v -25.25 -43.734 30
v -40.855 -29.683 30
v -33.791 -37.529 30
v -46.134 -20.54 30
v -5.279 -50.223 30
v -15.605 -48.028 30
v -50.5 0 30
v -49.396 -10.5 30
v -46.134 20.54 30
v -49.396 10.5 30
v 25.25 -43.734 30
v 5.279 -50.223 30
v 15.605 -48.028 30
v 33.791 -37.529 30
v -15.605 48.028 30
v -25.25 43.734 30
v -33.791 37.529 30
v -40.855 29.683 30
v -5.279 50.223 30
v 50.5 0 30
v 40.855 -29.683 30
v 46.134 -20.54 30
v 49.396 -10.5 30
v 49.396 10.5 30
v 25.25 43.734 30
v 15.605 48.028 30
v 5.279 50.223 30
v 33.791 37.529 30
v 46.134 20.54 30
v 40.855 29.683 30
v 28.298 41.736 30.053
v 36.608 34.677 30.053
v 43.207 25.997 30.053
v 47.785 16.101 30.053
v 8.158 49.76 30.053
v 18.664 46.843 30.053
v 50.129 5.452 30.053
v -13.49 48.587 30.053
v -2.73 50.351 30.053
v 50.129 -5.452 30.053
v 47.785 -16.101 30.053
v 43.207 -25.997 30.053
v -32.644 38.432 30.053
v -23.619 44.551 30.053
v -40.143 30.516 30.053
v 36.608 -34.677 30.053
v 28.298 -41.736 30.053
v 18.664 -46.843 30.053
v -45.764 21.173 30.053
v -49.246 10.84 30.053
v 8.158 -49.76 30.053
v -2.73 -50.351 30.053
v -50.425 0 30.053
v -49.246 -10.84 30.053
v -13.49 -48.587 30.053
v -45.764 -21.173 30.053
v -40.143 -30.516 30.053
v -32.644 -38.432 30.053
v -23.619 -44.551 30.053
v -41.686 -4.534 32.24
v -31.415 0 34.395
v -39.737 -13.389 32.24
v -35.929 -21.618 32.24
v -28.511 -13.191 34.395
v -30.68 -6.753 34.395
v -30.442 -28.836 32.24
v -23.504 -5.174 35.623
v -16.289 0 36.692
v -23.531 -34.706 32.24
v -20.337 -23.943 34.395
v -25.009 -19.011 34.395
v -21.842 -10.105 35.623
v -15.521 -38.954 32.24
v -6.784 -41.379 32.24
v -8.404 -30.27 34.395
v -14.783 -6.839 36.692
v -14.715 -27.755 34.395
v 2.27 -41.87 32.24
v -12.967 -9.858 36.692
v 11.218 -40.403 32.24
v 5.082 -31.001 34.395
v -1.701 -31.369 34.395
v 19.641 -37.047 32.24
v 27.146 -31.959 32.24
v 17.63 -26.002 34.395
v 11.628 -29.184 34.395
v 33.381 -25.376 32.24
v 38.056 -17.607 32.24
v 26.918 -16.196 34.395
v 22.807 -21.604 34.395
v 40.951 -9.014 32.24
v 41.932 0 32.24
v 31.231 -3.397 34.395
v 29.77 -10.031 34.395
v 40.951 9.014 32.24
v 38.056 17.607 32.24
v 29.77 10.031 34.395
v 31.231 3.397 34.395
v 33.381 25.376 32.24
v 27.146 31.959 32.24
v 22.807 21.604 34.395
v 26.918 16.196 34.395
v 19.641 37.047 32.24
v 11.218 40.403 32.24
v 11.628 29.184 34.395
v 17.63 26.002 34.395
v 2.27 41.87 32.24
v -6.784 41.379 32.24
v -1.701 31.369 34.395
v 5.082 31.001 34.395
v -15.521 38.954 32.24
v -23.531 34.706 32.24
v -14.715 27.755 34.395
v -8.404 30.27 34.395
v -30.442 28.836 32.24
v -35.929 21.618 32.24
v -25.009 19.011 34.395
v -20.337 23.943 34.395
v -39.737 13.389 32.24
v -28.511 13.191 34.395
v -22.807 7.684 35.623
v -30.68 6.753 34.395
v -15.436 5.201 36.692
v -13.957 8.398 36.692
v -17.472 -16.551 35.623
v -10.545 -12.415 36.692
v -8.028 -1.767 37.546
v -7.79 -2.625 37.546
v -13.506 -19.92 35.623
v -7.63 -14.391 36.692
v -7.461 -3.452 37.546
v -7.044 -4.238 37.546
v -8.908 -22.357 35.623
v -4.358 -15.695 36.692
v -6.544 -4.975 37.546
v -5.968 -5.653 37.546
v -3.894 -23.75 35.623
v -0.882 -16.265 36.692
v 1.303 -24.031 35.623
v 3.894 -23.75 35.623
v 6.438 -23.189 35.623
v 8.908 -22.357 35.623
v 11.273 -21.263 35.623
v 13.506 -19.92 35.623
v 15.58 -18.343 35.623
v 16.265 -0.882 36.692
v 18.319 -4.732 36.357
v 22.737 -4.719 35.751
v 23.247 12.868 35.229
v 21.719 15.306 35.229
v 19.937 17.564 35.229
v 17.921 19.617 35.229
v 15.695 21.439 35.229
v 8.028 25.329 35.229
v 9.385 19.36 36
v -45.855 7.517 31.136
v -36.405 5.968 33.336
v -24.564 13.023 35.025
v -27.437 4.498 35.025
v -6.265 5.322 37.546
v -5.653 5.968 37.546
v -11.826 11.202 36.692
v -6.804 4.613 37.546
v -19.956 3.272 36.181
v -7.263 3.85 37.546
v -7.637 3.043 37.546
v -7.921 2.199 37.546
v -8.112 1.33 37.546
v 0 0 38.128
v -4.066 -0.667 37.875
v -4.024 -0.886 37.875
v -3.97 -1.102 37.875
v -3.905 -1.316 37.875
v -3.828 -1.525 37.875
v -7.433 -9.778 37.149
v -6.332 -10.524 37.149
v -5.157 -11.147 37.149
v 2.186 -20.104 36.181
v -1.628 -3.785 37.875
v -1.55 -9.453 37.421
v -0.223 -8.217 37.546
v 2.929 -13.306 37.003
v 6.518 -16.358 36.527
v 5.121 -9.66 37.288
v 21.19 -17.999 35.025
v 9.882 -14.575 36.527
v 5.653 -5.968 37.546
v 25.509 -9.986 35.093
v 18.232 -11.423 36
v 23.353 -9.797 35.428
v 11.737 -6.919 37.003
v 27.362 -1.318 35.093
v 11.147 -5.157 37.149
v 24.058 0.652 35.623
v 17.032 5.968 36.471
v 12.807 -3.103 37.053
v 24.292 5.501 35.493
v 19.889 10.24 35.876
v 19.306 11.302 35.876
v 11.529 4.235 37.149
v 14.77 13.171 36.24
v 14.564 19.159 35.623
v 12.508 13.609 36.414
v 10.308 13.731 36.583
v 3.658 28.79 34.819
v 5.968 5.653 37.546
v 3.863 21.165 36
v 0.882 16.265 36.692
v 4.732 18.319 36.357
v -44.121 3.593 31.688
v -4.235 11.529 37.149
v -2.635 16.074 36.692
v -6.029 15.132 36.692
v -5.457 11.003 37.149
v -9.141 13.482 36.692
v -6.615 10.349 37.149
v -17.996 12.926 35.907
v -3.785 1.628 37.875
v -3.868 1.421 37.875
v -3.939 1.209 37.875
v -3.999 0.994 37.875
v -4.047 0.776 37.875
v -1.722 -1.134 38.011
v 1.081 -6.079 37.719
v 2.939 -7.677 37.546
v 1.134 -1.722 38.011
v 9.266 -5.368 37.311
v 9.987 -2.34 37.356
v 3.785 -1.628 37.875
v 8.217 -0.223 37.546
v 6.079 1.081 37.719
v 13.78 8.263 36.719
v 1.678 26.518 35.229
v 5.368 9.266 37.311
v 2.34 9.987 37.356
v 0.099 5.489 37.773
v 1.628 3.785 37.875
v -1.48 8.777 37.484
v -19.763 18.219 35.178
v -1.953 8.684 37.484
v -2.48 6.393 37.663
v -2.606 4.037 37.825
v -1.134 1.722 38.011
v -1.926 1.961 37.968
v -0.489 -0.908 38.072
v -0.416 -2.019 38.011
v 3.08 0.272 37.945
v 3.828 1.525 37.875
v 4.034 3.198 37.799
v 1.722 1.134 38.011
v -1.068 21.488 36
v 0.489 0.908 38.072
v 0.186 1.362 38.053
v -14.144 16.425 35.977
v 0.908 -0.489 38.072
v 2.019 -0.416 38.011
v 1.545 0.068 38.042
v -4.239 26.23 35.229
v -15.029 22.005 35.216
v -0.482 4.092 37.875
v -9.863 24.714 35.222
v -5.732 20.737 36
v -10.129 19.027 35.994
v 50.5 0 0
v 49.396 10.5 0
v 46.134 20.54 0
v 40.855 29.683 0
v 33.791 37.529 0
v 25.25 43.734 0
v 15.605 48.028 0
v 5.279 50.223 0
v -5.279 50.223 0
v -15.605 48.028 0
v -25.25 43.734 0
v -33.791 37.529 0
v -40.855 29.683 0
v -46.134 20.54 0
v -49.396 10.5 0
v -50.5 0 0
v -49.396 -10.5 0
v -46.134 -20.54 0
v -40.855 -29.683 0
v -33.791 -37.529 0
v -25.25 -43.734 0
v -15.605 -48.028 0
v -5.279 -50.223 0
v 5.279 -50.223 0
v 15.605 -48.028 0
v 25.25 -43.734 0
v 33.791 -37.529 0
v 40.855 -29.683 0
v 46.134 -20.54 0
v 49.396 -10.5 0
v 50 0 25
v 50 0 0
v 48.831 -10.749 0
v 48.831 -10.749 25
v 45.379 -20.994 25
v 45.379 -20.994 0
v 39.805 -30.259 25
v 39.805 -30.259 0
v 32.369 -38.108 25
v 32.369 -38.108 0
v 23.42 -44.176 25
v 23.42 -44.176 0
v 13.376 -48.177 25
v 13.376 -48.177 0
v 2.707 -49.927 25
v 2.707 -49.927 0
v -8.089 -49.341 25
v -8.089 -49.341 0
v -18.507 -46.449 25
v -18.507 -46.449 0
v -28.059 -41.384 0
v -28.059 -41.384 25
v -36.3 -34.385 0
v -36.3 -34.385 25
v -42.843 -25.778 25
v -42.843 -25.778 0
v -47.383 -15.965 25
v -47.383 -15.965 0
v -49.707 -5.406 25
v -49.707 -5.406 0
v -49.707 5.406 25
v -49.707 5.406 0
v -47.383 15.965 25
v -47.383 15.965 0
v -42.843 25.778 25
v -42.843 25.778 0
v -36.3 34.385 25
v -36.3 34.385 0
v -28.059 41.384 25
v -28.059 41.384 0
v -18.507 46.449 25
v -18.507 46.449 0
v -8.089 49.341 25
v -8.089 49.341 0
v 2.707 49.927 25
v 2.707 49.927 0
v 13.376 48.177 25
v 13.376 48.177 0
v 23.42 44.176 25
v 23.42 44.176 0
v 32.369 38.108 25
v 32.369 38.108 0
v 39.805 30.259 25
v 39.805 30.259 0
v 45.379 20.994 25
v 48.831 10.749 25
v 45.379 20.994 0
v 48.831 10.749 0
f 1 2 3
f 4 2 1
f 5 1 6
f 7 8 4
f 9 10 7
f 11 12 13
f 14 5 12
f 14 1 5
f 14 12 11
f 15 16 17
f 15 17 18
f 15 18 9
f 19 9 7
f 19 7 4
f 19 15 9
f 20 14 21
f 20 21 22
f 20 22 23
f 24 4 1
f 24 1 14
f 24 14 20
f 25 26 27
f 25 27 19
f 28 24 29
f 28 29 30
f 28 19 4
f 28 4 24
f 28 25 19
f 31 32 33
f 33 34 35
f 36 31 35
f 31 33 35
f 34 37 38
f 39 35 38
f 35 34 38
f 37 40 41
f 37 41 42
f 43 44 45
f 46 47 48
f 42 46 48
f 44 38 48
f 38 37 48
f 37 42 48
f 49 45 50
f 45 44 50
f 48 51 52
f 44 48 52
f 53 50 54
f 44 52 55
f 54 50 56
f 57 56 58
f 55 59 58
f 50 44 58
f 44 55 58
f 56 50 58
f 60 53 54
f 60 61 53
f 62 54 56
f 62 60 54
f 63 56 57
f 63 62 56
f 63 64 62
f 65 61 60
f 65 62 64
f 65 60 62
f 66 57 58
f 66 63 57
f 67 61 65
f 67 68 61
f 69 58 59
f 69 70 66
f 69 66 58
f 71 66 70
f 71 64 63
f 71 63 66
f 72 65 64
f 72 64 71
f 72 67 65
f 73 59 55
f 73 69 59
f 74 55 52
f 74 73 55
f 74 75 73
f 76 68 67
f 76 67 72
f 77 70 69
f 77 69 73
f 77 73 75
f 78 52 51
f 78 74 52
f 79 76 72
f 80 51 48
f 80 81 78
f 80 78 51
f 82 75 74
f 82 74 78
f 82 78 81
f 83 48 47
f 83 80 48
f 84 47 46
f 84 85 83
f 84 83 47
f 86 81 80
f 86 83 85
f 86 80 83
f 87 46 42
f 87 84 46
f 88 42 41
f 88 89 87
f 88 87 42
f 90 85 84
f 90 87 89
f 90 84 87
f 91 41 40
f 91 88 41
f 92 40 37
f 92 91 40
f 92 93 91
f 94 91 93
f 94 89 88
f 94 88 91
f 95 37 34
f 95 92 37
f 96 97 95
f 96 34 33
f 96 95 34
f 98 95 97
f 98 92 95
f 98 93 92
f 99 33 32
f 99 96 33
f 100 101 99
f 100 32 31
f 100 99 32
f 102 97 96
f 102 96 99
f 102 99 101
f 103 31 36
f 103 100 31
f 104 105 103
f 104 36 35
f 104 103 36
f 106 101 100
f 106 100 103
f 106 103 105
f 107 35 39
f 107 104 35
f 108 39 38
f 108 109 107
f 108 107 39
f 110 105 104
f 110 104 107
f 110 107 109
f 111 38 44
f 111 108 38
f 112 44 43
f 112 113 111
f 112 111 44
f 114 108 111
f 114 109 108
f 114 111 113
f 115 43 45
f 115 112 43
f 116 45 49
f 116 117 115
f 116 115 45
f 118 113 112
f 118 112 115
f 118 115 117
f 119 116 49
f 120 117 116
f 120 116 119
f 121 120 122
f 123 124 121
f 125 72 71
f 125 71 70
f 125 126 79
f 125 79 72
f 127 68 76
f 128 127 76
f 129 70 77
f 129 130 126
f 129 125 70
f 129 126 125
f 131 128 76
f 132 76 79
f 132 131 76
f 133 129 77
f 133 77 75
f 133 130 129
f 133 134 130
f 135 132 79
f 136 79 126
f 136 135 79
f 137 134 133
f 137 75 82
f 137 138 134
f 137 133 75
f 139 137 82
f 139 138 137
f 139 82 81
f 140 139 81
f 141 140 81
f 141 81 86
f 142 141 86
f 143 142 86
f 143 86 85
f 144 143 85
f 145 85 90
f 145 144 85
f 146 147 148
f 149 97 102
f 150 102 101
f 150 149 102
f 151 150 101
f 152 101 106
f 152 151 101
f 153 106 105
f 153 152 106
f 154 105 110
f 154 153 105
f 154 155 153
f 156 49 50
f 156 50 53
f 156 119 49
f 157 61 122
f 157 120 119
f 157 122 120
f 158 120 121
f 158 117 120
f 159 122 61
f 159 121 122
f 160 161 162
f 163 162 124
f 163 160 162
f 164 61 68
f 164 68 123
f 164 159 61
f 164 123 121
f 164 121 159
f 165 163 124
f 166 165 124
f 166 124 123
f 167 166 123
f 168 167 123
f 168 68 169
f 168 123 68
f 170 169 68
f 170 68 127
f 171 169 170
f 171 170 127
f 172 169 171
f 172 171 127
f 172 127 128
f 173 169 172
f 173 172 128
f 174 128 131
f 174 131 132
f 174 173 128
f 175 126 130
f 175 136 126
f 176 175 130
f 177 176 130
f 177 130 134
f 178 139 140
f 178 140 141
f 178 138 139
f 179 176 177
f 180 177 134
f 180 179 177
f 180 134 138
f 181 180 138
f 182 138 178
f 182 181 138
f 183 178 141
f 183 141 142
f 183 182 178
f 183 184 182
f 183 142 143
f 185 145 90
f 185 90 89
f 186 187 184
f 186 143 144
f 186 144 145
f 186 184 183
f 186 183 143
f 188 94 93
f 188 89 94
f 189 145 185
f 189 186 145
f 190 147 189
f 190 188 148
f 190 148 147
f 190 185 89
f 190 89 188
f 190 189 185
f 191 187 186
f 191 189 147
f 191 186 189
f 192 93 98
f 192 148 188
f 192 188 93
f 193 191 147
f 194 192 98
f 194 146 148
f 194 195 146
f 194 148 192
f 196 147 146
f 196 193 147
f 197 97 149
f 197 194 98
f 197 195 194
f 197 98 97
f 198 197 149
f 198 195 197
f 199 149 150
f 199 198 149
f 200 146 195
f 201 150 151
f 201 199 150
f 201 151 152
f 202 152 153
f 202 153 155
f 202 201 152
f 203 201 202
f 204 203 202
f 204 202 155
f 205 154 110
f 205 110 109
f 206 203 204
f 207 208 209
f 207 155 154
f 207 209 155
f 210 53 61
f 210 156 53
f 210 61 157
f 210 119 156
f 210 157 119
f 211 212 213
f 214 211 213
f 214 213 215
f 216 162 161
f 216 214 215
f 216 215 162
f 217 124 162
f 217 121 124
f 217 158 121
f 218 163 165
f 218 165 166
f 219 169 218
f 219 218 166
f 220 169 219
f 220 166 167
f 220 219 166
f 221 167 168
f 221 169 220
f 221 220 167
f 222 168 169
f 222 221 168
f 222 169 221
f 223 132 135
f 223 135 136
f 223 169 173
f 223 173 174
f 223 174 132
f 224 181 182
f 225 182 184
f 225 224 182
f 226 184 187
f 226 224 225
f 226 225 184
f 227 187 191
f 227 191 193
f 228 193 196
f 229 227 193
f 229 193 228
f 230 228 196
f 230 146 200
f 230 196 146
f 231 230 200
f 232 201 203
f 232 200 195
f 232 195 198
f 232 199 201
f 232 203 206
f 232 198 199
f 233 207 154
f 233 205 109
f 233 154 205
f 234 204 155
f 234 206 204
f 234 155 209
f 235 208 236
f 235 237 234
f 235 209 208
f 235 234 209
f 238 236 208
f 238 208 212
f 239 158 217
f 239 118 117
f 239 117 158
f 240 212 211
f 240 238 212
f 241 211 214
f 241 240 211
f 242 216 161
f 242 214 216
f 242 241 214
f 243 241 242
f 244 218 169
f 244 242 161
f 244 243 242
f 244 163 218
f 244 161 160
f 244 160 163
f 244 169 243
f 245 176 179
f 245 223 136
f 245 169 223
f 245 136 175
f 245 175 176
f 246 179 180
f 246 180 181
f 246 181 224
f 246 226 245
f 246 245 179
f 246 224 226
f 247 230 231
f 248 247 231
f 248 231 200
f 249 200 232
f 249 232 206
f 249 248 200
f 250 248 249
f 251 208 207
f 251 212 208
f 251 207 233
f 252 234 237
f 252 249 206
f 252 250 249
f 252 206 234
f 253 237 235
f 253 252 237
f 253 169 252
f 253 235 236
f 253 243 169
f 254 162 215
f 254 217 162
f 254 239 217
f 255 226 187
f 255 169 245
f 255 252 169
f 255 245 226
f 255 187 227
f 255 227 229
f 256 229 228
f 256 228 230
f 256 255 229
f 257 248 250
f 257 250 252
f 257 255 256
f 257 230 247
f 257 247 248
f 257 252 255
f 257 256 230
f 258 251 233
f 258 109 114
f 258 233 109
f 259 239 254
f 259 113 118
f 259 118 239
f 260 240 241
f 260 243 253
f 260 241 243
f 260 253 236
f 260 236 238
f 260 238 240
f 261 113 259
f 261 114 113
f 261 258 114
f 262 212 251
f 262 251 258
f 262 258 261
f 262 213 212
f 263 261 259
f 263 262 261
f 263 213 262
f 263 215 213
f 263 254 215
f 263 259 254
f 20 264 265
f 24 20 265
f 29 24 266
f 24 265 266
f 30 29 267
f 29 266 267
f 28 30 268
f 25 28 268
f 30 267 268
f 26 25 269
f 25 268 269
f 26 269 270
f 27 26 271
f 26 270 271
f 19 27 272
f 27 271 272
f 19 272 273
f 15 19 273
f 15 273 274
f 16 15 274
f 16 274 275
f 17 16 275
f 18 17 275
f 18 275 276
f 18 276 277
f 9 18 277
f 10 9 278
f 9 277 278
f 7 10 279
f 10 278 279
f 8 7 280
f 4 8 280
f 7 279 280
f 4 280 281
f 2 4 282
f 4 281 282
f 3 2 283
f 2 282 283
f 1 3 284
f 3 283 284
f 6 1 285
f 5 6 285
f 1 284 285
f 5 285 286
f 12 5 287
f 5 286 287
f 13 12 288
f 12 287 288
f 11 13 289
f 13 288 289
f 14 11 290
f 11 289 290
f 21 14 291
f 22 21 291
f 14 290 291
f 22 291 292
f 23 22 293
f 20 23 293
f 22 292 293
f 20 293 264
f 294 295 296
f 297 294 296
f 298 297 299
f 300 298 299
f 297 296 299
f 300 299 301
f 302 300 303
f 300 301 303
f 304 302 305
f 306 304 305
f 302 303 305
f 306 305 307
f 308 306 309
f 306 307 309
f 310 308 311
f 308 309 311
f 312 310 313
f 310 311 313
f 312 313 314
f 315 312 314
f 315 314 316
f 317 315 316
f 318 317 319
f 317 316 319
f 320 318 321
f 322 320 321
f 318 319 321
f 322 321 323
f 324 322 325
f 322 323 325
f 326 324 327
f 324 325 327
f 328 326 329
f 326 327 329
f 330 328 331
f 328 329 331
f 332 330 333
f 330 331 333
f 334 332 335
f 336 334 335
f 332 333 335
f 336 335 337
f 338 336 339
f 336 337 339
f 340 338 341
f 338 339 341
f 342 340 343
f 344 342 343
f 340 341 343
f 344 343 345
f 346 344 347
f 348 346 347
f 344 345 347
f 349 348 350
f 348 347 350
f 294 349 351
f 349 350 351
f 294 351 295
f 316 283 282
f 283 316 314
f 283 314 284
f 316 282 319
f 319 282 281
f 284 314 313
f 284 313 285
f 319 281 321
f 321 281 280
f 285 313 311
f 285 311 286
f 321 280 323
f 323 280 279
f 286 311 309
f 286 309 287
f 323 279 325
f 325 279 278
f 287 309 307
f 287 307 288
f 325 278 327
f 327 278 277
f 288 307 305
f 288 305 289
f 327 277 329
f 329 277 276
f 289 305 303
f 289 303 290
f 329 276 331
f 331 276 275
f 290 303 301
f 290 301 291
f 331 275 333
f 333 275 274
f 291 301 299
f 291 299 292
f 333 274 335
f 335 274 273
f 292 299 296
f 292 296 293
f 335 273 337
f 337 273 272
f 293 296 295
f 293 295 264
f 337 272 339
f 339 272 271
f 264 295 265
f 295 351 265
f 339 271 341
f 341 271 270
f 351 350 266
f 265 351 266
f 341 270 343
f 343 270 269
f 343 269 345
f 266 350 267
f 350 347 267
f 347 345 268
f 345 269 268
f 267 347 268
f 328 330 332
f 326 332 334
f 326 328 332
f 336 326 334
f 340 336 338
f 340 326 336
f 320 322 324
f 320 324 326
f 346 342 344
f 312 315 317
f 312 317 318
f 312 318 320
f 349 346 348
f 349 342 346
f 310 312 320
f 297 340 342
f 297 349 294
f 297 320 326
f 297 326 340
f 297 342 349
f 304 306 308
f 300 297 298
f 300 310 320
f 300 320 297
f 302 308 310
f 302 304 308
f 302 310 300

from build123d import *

# Parameters (mm, degrees)
F0_R     = 50.5
F1_DEPTH = 30
F2_R     = 50
F3_DEPTH = 25


with BuildPart() as f1:
    # F0 (on Top) → F1 (new body)
    with BuildSketch(Plane.XY):
        Circle(F0_R)
    extrude(amount=F1_DEPTH)

    # F2 (on face) → F3 (cut)
    with BuildSketch(Plane(origin=(0, 0, 0), x_dir=(1, 0, 0), z_dir=(0, 0, -1))):
        Circle(F2_R)
    extrude(amount=-F3_DEPTH, mode=Mode.SUBTRACT)


with BuildPart() as f5:
    # F4 (on Front) → F5 (revolve)
    with BuildSketch(Plane.XZ):
        with BuildLine():
            add(Edge.make_bspline(
                [(-50.424606, 30.05288), (-39.487511, 33.243593), (-19.800009, 37.100423), (0, 38.128462)],
                knots=[0, 0, 0, 0, 51.06717, 51.06717, 51.06717, 51.06717], degree=3))
            Line((-50.424606, 30.05288), (0, 30.05288))
            Line((0, 30.05288), (0, 38.128462))
        make_face()
    revolve(axis=Axis((0, 0, 34.090671), (0, 0, 1)))


solid = Compound([f1.part, f5.part])
